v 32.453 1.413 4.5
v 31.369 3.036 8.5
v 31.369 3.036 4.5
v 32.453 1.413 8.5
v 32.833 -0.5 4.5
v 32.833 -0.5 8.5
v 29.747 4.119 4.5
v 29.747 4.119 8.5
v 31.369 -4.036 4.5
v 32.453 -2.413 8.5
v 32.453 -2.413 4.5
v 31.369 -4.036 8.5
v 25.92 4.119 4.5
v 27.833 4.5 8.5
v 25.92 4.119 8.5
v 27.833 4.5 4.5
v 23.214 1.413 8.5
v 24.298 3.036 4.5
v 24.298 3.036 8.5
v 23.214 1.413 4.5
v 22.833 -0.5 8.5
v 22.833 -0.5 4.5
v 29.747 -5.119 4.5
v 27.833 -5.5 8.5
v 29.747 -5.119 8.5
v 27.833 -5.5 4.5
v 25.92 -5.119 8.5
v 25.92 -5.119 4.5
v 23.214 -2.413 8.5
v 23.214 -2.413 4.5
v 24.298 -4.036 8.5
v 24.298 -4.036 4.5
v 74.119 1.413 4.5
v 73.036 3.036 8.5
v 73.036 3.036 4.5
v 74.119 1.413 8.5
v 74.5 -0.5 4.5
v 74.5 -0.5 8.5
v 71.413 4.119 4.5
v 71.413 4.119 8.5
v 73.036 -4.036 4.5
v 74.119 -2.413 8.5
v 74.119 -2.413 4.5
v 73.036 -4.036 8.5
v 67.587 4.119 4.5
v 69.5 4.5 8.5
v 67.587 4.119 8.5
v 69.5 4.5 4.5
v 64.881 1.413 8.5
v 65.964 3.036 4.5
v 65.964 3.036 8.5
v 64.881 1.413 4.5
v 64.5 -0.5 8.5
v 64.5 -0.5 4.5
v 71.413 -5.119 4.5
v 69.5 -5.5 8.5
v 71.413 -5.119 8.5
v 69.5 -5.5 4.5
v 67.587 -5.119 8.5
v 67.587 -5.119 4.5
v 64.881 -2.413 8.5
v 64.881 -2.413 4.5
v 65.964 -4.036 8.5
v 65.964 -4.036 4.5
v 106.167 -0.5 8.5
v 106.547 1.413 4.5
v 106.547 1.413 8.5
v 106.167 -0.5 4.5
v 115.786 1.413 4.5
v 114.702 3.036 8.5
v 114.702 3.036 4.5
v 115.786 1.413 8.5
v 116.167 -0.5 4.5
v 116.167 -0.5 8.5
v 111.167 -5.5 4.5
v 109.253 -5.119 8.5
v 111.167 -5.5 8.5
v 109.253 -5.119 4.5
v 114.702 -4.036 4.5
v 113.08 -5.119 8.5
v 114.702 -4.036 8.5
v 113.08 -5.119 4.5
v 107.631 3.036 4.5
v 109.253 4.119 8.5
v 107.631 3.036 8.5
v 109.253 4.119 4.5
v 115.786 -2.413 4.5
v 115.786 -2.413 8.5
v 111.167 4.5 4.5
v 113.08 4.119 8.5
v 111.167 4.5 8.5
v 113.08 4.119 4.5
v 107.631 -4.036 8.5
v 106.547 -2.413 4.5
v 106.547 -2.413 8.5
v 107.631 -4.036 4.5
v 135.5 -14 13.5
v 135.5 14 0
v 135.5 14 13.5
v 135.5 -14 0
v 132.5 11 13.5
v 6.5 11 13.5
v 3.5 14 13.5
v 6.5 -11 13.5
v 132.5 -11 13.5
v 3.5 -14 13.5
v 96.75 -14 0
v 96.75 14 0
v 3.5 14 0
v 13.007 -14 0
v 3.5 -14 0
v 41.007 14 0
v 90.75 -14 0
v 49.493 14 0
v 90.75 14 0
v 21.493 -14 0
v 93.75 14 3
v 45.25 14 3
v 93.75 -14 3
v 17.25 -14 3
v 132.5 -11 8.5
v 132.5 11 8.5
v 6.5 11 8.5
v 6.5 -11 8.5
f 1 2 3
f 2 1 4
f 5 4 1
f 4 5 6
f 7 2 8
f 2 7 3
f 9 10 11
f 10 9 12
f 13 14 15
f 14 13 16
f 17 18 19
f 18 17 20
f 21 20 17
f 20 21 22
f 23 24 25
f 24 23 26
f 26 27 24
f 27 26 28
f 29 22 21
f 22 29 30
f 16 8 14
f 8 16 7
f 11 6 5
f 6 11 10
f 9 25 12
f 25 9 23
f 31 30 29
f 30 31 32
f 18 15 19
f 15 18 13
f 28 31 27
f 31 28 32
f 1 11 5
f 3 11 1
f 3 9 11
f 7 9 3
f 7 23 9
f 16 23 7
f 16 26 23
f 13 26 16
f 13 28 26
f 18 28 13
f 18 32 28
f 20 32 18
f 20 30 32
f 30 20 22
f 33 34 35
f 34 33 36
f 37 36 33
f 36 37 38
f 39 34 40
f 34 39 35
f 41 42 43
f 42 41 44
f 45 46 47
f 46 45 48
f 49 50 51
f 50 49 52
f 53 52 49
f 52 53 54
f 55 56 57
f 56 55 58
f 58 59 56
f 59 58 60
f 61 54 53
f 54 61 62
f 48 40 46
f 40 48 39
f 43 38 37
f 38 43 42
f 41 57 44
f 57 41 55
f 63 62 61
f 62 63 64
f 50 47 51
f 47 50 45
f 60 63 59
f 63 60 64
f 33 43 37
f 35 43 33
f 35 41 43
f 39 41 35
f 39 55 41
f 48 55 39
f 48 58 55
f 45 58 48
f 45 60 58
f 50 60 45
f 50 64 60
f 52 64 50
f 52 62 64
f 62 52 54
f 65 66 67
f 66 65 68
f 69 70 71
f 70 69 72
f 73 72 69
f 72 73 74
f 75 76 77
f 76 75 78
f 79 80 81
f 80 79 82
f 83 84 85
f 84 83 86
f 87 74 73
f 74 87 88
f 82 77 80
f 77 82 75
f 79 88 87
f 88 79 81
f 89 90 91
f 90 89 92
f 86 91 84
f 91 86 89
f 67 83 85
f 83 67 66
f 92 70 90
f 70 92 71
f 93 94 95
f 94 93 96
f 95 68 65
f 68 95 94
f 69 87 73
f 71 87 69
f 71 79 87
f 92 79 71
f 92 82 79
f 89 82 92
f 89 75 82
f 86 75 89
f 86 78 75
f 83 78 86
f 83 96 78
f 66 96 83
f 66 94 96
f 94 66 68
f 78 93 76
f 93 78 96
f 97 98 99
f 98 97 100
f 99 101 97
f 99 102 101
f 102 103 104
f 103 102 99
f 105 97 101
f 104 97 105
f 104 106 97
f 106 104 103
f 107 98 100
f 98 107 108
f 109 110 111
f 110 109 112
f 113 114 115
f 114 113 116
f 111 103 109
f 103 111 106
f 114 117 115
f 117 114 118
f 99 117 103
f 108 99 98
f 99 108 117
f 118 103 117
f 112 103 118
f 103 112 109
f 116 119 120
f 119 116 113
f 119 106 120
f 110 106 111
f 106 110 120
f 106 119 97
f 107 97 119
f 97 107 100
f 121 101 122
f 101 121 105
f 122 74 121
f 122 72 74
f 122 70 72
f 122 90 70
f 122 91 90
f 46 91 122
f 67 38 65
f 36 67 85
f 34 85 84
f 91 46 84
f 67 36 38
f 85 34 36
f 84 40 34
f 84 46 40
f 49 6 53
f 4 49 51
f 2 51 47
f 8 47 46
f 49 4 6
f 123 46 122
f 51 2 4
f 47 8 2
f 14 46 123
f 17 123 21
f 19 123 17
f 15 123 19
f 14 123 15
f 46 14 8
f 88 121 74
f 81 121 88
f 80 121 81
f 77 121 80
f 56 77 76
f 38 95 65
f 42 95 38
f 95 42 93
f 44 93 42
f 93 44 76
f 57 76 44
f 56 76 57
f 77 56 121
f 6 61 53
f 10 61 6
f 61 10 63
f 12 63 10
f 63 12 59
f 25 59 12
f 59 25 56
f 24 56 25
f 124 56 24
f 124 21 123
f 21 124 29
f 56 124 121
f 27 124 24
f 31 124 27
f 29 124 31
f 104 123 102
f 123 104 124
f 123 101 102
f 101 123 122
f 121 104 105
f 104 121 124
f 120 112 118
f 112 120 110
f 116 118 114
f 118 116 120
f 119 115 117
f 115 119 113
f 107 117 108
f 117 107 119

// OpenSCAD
// [FL_INDEX: keywords="openscad, 3d_parametric, Magnetized_Soft_Jaws, csg_solid" | COT="Parametric OpenSCAD design from 3DCodeverse"]
// Title: Magnetized Soft Jaws

// measured from the vise
vise_jaw_width = 125; 

// measured from the vise
vise_jaw_height = 21;

// how far to extend the "walls" of the jaw around the top, bottom, and sides of the vise jaw
surround_depth = 5;

// is the measured distance the vise jaw extends past the vise body
overlap = 1.26;

// desired value. The printed thickness of the face will be the greater of soft_jaw_face_thickness and cutout_guide_radius + 1.5
soft_jaw_face_thickness = 6;

// desired value 
soft_jaw_wall_thickness = 3;

// controls how deep the guides are cut into the face of the soft jaws. 3mm is good for holding small round stock. If you want to hold stock bigger than about 3/8", increase the guide radius. 
cutout_guide_radius = 3; 

// controls the angles at which the guides are cut into the face of the soft jaws. You might print one face with a guide at [0] and the other face with guides at [45,90].
cutout_angles = [45,90];

// inserts some slop at certain dimensions to allow for printer spooge
fudge_factor = 0.5;

magnet_diameter = 10;
magnet_depth = 4;
magnet_count = 3;

guide_radius = 3;
guide_angles = [45, 90];


mOff = vise_jaw_width/magnet_count;
gOff = vise_jaw_width/len(guide_angles);
jDepth = max(soft_jaw_face_thickness, 
  magnet_depth + 
  (len(guide_angles) > 0 ?  guide_radius : 0) +
  1.5
);

difference() {
  translate([
    soft_jaw_wall_thickness + fudge_factor,
    -vise_jaw_height/2-soft_jaw_wall_thickness-fudge_factor,
    0])
    difference() {
      cube([
        vise_jaw_width + fudge_factor*2 + soft_jaw_wall_thickness*2, 
        vise_jaw_height + fudge_factor*2 + soft_jaw_wall_thickness*2, 
        jDepth + surround_depth]);
      translate([soft_jaw_wall_thickness, soft_jaw_wall_thickness, jDepth]) 
        cube([vise_jaw_width + fudge_factor*2, vise_jaw_height + fudge_factor*2, surround_depth+1]);
      for (step = [magnet_count-1 : 0]) {
        translate([soft_jaw_wall_thickness + fudge_factor + mOff*(step+0.5), vise_jaw_height/2 + soft_jaw_wall_thickness, jDepth - magnet_depth])
          cylinder(r=magnet_diameter/2, h=magnet_depth+1, center=false);
      }
    }
    for (i = [len(guide_angles)-1:0])
      translate([gOff*(i+0.5),0])
        rotate([0,90,guide_angles[i]])
          cylinder(r=guide_radius, h=2*vise_jaw_width, center=true, $fn=4);
}
